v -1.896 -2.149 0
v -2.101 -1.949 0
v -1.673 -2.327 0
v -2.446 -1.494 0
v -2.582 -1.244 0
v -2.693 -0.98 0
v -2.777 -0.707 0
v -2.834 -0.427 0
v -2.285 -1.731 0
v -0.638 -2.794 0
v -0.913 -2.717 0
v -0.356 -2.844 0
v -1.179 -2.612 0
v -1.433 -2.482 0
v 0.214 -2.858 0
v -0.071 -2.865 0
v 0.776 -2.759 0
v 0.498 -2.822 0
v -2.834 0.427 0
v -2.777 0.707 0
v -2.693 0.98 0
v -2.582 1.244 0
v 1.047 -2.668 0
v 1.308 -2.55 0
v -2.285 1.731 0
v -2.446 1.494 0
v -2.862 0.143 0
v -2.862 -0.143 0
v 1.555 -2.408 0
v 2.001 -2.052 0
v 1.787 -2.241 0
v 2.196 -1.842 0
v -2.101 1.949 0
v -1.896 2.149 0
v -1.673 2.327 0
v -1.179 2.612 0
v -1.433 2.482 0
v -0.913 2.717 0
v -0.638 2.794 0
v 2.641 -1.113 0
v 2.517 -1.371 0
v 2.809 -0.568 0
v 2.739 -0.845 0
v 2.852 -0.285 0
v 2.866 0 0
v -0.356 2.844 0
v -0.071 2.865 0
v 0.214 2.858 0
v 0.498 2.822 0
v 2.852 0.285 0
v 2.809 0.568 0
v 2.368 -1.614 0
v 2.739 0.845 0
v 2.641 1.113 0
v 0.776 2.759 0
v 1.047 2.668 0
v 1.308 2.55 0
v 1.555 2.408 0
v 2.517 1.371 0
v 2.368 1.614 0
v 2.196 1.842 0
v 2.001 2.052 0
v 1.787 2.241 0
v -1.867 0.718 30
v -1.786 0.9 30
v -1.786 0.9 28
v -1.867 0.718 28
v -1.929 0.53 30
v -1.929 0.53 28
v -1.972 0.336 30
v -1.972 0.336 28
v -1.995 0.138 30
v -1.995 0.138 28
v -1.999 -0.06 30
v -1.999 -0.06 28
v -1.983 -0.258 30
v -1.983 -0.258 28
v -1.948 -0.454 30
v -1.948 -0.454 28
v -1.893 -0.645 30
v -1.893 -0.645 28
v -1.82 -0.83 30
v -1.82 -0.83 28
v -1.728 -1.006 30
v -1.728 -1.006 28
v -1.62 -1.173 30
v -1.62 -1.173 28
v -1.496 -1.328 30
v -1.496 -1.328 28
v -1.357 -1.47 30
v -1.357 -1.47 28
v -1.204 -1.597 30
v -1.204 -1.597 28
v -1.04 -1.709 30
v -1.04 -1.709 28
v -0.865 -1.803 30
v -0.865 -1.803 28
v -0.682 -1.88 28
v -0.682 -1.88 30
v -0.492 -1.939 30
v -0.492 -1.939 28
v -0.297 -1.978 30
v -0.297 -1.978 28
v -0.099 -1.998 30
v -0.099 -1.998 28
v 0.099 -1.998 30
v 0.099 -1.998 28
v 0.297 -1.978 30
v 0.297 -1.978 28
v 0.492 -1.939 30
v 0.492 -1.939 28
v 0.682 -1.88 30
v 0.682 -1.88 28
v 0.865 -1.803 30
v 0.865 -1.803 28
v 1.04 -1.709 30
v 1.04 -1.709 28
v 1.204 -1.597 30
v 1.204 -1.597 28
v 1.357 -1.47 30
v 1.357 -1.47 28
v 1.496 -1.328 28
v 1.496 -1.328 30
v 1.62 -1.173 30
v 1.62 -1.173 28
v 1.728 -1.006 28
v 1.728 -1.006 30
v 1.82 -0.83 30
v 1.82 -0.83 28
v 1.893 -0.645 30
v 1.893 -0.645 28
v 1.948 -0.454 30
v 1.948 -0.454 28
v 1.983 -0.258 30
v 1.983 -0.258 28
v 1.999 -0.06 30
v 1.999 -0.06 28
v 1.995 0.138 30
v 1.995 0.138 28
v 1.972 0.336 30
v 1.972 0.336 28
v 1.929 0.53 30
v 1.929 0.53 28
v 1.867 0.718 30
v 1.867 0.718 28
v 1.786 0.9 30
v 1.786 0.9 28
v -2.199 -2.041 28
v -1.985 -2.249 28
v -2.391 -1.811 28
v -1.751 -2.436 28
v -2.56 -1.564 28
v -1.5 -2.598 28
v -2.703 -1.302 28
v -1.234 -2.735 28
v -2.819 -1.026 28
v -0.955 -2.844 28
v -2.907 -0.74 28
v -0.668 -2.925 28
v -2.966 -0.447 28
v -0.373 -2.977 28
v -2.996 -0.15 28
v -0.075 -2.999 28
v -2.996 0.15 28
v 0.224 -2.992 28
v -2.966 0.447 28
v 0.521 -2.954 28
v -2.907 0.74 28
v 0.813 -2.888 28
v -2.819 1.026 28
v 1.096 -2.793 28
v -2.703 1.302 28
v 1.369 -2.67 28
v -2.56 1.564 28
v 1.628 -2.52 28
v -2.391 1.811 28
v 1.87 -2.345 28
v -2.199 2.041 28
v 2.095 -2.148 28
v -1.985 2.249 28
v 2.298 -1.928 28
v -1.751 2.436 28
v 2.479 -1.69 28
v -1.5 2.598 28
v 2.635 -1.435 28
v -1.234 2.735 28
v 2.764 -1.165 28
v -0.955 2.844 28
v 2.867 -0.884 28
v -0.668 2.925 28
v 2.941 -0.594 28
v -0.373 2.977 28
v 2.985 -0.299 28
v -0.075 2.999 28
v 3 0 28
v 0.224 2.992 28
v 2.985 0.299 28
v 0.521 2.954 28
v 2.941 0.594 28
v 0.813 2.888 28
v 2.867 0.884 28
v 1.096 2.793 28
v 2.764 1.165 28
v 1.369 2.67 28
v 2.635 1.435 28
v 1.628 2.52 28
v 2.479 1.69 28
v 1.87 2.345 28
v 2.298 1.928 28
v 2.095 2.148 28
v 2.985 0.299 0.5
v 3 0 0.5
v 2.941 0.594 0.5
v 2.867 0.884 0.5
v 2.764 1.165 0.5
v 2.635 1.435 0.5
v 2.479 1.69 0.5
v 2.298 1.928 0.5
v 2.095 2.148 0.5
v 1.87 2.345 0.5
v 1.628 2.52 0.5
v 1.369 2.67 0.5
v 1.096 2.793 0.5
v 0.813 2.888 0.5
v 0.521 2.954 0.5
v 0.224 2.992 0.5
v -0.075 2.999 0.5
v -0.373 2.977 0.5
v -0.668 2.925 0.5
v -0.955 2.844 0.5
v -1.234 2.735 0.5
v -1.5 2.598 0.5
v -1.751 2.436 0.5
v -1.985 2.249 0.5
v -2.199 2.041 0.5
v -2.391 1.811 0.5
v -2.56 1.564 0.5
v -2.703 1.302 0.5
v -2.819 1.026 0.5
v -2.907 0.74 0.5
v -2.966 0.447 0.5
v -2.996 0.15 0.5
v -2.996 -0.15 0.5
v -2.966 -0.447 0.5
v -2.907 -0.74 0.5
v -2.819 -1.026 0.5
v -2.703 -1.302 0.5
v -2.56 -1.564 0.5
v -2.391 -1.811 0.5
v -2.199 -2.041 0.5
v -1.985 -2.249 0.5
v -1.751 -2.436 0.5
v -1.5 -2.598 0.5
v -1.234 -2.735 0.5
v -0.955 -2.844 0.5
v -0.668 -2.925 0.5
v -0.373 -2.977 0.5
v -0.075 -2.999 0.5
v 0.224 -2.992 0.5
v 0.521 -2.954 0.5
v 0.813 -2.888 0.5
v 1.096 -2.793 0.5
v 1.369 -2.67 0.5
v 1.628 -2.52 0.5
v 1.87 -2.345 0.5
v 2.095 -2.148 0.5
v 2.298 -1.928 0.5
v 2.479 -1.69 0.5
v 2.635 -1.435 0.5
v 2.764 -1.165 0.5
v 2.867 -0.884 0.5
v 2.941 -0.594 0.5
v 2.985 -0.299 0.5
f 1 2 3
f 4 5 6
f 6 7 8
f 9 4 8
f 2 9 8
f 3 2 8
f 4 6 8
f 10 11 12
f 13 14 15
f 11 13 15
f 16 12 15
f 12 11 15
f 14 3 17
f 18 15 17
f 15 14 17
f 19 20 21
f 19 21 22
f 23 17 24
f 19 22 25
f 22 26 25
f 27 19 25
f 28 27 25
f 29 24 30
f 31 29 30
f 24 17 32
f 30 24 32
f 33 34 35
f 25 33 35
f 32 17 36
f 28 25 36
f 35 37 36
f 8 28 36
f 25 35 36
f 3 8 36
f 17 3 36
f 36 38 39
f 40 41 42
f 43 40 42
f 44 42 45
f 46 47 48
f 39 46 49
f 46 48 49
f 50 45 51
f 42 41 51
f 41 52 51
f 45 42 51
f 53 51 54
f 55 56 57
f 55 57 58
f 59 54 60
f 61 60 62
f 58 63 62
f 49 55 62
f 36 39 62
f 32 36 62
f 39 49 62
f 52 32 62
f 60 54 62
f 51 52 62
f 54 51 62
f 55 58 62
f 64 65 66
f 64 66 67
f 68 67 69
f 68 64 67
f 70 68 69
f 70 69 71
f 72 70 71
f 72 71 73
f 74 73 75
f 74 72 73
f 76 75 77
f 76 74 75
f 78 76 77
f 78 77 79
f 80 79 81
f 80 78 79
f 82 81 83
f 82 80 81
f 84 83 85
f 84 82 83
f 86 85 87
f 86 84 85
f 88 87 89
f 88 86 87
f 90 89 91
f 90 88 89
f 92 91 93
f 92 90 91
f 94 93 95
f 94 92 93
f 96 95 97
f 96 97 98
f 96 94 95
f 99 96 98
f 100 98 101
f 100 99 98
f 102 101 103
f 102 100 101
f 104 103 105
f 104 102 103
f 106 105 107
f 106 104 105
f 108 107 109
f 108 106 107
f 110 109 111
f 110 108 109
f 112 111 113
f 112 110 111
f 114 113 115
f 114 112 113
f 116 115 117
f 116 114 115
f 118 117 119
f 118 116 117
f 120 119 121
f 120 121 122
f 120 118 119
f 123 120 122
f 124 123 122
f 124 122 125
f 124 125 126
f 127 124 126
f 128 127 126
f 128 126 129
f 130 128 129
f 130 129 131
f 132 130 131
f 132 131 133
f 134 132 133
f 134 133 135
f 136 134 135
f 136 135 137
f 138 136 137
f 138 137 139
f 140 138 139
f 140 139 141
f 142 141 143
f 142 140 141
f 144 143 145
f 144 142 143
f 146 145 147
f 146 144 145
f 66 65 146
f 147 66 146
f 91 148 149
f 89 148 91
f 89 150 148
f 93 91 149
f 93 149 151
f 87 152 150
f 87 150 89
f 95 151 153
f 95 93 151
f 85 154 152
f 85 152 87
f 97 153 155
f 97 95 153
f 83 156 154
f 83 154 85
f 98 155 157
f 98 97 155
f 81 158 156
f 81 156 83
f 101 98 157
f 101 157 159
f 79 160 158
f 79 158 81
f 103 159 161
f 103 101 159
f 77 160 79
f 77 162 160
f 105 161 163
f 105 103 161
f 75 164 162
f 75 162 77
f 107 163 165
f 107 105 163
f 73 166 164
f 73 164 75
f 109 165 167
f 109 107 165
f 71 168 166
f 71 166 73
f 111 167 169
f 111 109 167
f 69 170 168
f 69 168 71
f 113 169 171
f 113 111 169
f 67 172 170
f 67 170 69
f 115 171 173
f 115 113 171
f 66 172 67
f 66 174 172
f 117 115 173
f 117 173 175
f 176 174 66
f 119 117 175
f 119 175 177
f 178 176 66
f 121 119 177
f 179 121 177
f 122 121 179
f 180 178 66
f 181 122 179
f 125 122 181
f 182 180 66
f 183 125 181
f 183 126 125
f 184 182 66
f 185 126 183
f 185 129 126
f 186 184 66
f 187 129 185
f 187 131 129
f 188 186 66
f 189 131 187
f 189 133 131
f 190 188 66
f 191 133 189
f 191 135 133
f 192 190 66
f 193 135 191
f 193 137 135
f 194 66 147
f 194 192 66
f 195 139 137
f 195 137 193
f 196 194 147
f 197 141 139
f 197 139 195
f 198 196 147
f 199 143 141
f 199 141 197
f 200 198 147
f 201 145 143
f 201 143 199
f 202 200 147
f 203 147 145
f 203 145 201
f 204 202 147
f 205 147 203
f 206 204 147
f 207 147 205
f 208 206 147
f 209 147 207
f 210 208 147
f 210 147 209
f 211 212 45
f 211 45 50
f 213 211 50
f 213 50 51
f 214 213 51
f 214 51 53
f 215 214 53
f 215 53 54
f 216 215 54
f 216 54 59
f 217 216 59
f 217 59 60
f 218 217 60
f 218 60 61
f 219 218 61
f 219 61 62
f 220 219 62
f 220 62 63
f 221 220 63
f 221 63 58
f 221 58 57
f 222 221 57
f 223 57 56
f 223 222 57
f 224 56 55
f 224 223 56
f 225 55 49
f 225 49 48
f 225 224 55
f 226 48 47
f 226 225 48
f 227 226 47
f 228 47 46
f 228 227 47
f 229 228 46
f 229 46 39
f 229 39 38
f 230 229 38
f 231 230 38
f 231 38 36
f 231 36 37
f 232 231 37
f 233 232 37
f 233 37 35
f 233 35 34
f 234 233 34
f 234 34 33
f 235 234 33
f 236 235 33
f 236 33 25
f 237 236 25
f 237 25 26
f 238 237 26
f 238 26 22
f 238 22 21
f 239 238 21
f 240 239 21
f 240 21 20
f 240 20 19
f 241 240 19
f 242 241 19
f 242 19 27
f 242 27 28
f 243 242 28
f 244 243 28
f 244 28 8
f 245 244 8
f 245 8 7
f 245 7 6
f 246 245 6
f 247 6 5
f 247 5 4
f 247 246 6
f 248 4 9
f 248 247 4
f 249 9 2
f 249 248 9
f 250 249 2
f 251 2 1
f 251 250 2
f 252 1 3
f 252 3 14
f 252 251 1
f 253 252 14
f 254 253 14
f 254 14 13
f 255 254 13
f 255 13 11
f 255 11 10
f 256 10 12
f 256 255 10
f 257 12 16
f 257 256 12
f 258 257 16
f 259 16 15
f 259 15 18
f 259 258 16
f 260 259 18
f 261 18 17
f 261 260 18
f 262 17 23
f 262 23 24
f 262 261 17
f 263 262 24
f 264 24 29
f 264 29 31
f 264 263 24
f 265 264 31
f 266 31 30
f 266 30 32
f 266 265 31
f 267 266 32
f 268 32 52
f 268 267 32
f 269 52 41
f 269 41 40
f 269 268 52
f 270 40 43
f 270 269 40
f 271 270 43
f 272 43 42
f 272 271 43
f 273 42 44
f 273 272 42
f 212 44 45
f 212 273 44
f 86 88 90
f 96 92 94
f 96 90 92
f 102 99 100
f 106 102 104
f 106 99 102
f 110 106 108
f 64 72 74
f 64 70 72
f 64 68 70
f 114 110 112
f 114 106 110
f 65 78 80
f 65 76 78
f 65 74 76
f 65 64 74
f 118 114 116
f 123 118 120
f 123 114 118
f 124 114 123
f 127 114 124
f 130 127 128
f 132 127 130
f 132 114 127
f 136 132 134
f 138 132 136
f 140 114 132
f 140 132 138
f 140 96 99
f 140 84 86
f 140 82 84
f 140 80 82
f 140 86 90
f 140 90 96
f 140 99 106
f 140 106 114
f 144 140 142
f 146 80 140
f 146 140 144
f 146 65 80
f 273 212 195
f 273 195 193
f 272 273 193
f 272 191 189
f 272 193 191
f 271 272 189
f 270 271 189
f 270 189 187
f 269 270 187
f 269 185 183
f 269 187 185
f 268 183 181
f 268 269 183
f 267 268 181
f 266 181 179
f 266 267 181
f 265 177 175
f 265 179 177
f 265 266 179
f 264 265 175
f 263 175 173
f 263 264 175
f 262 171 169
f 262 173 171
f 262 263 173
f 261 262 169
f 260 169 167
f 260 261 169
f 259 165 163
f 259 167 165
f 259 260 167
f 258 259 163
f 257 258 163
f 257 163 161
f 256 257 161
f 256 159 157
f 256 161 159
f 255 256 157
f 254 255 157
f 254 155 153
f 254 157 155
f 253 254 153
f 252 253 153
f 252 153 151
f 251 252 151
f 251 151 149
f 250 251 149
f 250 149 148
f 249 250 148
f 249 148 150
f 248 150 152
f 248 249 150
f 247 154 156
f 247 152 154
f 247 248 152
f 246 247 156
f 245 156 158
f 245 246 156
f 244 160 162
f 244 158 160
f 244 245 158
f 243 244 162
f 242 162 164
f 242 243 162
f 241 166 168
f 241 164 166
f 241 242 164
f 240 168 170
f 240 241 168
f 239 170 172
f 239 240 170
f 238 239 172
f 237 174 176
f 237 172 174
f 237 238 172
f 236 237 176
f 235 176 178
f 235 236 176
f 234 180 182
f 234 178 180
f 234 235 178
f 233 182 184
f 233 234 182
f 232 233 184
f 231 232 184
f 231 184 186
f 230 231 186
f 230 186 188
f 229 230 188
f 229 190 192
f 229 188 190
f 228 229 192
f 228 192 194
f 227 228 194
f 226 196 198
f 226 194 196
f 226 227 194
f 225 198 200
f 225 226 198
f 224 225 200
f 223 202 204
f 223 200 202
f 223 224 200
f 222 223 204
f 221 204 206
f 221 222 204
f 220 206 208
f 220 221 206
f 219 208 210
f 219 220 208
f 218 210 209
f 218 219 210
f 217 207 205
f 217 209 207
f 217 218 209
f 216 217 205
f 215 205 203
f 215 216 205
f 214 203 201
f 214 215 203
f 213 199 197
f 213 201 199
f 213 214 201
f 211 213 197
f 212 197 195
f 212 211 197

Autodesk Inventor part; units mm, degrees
ref_plane "YZ Plane" through (0, 0, 0) normal (1, 0, 0) x (0, 1, 0)
ref_plane "XZ Plane" through (0, 0, 0) normal (0, 1, 0) x (-1, 0, 0)
ref_plane "XY Plane" through (0, 0, 0) normal (0, 0, 1) x (1, 0, 0)
sketch "スケッチ1" plane through (0, 0, 0) normal (0, 0, 1) x (1, 0, 0)
  circle A0 centre (0, 0) radius 3
  dimension "d0" = 6
extrude "押し出し1" add sketch "スケッチ1" along normal blind 30
chamfer "面取り1" distance 0.5 angle 15 2 edges at (-3, 0, 0) (-3, 0, 30) measured on face at (2.9903, -0.2414, 20)
sketch "スケッチ2" plane through (0, 0, 30) normal (0, 0, 1) x (1, 0, 0)
  circle A0 centre (0, 0) radius 3 projected
  circle A1 centre (0, 0) radius 2
  line L0 (-1.7861, 0.9) -> (1.7861, 0.9)
  dimension "d7" = 4
  dimension "d8" = 0.9
extrude "押し出し2" cut sketch "スケッチ2" against normal blind 2 contours A0 | L0 A1 picked at (-0.2398, 1.4933)
properties part number "平行ピンD6L30Dcut" material "ステンレス鋼"
